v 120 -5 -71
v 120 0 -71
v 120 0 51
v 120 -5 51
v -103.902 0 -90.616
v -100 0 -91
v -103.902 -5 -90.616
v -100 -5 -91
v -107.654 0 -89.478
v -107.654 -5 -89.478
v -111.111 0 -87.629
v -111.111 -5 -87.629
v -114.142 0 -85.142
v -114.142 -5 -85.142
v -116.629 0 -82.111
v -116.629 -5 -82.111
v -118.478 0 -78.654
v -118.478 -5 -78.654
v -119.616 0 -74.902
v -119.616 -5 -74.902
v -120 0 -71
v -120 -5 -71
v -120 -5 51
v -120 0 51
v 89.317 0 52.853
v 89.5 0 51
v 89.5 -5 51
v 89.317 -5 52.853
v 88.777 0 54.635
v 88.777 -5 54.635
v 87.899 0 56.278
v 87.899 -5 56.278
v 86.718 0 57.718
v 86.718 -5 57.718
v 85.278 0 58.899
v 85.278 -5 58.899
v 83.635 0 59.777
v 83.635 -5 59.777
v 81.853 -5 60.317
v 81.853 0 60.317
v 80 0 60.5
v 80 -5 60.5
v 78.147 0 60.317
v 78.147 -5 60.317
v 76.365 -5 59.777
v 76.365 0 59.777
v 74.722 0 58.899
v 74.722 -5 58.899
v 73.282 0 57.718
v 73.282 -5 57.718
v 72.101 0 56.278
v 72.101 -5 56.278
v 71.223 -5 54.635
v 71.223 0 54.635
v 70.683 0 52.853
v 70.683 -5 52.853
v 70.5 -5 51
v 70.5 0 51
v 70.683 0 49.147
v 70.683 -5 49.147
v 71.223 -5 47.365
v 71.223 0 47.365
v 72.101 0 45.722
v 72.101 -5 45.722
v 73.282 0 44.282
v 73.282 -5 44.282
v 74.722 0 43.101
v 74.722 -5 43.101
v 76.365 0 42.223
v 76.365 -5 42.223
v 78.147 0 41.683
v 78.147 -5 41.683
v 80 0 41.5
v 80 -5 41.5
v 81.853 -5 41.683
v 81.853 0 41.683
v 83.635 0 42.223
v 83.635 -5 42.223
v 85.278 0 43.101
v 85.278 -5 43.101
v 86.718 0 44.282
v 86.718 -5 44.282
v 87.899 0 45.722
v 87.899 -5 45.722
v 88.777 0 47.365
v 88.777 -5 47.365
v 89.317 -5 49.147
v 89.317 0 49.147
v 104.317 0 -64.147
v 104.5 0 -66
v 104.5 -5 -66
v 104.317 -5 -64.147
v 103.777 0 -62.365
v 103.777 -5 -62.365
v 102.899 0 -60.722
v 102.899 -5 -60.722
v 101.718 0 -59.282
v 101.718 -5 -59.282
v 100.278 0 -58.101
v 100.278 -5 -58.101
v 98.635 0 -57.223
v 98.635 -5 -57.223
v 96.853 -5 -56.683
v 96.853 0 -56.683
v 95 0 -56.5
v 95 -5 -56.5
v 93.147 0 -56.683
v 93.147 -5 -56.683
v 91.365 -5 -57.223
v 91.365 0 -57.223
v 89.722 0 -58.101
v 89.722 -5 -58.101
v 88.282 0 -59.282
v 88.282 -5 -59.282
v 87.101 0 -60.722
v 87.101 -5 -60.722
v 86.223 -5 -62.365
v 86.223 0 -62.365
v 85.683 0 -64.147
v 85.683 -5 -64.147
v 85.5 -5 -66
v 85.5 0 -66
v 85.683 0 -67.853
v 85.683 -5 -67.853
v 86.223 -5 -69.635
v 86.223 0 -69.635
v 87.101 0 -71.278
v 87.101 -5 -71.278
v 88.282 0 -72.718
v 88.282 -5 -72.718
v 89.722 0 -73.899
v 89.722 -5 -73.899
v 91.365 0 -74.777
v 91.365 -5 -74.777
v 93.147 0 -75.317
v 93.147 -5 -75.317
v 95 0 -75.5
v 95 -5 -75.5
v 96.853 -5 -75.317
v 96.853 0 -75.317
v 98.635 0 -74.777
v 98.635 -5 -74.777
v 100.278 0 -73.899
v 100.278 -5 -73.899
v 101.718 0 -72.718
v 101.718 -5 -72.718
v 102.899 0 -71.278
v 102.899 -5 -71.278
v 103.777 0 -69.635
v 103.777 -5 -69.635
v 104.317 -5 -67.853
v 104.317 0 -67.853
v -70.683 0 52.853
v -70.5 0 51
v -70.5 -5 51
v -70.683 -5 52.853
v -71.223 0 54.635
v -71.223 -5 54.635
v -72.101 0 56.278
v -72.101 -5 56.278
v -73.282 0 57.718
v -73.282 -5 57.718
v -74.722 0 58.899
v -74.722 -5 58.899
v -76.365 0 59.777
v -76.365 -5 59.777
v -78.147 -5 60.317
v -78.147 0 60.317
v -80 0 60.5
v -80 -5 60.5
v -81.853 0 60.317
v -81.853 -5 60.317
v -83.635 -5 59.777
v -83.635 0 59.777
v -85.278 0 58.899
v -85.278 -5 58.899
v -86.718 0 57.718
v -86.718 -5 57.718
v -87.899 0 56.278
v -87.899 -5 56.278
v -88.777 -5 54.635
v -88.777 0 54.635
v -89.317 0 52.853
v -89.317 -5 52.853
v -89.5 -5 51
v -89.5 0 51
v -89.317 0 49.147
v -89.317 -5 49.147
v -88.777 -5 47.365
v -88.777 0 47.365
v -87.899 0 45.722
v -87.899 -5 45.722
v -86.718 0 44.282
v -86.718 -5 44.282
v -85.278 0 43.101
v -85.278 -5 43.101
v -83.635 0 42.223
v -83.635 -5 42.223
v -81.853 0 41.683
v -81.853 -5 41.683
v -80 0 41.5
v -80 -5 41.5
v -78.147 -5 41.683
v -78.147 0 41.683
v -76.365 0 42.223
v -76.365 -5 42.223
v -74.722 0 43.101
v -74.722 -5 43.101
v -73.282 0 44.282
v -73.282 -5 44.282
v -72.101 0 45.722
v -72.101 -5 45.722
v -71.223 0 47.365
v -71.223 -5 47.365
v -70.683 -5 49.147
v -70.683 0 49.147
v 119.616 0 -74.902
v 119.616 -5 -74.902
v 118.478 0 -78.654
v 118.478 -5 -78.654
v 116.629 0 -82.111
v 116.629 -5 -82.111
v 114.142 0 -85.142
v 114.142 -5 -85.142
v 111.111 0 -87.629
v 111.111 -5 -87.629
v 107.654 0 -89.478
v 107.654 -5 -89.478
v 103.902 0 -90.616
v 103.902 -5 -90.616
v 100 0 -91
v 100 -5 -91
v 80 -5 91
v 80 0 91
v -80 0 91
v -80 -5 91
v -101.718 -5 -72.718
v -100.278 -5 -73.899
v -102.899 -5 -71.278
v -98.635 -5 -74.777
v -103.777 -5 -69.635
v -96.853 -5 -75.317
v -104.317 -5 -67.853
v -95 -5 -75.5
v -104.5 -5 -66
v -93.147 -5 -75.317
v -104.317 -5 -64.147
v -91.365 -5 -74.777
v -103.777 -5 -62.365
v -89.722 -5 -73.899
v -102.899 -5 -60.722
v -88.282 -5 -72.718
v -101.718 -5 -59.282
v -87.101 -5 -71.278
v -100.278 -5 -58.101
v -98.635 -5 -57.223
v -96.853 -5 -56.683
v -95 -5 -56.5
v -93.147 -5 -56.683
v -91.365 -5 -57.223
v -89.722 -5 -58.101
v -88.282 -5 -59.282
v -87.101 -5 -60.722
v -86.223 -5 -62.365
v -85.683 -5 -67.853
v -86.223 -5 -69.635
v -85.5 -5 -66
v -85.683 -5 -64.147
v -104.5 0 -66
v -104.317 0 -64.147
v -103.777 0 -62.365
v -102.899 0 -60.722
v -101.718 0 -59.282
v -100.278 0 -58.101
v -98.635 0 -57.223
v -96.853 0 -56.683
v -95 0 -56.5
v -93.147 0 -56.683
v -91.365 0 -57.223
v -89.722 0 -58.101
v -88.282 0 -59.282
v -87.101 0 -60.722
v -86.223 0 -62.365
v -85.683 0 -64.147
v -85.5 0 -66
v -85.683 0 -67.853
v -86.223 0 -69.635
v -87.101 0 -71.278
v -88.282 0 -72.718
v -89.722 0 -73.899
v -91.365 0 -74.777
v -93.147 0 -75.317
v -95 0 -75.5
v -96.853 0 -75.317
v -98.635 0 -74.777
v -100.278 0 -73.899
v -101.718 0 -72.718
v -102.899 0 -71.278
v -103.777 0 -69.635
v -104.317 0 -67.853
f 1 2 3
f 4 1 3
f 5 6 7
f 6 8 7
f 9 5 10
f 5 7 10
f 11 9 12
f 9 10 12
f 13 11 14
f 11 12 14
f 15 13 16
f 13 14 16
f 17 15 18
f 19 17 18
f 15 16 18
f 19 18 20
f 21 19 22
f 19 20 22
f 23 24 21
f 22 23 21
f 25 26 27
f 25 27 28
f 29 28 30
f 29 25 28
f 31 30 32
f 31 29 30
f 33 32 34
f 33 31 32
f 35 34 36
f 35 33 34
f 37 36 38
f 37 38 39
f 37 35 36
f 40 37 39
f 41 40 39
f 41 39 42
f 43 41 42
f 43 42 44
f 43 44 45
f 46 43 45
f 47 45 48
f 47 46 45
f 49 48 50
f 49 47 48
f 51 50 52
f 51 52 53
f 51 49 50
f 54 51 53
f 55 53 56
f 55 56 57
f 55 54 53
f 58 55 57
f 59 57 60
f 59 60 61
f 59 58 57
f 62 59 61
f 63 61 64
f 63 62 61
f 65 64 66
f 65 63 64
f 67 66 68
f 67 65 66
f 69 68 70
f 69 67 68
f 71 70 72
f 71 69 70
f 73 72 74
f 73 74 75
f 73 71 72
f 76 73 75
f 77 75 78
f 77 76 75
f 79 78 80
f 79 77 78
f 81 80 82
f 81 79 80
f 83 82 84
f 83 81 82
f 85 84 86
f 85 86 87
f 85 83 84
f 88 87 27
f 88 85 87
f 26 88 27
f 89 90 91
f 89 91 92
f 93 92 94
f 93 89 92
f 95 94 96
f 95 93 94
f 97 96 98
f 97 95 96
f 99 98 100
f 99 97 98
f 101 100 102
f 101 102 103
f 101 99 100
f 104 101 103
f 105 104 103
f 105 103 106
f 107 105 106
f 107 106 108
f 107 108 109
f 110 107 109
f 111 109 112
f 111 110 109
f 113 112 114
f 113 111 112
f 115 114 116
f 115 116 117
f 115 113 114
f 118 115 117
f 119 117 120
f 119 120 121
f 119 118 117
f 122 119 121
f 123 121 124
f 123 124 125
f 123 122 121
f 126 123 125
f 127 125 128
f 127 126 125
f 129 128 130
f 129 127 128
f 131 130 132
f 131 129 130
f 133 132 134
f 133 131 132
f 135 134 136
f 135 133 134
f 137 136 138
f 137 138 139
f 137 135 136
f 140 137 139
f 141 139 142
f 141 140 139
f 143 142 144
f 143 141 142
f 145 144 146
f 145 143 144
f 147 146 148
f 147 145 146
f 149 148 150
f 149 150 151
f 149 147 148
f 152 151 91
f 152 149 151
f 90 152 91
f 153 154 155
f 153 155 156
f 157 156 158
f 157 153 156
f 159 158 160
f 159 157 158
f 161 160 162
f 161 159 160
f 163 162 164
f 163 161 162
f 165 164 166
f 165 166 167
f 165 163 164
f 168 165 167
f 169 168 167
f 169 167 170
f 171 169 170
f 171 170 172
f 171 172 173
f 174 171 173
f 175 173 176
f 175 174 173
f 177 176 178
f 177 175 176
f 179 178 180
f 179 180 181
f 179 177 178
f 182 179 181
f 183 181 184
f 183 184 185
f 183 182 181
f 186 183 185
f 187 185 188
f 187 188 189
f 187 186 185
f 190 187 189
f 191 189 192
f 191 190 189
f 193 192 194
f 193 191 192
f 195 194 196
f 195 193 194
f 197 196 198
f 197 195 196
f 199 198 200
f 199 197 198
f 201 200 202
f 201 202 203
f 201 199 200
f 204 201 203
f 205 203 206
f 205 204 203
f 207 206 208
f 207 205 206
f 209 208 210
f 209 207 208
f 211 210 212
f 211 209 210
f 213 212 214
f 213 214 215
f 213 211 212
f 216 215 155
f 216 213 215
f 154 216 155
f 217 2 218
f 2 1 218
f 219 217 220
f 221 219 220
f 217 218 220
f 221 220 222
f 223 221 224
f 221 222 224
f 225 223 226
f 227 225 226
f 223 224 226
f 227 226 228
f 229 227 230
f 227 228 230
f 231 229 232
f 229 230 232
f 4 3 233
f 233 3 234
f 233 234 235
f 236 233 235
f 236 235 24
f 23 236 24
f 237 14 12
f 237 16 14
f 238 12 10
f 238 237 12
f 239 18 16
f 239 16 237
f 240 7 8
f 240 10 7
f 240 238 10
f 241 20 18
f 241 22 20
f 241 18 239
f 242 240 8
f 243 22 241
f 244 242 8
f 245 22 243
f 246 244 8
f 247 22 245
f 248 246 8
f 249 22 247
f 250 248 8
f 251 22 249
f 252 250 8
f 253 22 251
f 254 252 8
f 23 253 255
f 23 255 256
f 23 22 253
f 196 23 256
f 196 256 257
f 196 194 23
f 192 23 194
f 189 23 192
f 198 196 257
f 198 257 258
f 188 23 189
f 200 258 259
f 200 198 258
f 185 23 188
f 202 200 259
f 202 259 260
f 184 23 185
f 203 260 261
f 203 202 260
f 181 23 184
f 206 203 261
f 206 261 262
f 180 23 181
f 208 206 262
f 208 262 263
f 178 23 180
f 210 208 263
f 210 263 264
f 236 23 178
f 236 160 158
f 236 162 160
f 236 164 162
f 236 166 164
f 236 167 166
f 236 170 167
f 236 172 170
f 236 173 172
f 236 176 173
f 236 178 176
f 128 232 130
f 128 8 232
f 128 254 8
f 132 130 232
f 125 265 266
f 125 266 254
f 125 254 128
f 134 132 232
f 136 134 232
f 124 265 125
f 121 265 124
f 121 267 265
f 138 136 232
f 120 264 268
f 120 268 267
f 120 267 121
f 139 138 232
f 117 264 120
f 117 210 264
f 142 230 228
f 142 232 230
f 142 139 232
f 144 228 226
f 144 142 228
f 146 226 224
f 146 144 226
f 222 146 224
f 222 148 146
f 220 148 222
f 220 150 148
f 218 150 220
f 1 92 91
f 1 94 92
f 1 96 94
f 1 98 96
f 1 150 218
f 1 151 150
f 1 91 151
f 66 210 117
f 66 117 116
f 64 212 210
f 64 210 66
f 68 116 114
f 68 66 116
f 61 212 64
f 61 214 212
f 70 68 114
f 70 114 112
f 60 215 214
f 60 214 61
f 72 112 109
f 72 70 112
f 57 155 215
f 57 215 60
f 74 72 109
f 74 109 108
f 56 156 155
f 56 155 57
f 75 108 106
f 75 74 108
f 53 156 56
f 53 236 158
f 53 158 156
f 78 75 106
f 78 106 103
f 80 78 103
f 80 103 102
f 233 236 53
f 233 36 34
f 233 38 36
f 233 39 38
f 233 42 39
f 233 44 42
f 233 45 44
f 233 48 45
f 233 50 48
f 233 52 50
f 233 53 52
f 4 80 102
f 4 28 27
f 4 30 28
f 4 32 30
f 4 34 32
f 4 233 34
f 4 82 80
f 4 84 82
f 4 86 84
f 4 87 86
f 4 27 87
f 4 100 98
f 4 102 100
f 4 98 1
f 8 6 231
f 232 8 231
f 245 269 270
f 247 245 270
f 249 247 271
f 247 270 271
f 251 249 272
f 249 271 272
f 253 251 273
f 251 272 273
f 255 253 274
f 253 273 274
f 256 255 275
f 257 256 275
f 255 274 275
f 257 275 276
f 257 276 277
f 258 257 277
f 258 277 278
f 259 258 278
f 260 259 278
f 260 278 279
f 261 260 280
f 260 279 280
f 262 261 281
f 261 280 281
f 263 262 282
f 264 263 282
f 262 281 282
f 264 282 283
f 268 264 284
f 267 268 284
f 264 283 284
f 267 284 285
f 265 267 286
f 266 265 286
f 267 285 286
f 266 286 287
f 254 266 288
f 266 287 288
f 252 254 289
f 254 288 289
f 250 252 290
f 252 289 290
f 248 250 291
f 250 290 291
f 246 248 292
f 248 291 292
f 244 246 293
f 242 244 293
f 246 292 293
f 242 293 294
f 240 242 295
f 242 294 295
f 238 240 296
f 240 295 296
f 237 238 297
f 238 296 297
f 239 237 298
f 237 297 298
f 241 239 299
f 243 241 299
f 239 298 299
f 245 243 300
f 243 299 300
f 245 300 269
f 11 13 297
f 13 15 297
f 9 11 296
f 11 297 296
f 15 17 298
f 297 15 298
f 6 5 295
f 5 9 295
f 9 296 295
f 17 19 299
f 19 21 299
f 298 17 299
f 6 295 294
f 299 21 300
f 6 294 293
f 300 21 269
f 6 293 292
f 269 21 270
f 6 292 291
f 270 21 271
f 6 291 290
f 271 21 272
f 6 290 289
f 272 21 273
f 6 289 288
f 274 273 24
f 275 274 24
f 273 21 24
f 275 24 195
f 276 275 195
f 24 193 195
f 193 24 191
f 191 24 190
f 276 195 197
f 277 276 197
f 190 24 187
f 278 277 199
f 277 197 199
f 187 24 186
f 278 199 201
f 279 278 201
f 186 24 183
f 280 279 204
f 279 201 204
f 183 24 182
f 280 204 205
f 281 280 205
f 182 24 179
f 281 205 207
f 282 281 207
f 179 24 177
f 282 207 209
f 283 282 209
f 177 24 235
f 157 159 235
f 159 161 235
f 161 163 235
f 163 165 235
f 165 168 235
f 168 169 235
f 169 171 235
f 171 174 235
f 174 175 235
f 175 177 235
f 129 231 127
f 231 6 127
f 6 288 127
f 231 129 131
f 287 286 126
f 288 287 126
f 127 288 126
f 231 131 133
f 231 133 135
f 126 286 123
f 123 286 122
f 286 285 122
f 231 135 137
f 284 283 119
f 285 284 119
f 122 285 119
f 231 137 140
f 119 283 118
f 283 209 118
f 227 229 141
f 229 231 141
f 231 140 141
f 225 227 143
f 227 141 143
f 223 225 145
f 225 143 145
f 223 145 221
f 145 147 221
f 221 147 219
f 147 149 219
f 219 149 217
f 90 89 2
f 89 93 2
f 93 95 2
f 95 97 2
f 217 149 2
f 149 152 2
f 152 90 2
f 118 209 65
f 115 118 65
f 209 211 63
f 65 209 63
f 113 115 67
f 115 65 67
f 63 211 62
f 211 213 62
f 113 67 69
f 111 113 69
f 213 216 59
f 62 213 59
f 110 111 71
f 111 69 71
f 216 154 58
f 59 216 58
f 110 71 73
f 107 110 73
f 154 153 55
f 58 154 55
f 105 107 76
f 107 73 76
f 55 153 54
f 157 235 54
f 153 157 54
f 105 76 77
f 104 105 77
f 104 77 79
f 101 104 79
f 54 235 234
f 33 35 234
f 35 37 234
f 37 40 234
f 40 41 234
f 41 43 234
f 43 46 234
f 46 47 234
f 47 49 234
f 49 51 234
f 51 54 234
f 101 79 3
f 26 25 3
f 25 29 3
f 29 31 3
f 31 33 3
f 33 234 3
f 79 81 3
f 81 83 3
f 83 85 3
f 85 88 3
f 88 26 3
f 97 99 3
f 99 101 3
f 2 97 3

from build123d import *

# Parameters (mm, degrees)
F0_R     = 9.5
F1_DEPTH = 5
F2_R     = 20


with BuildPart() as f1:
    # F0 (on Front) → F1 (new body)
    with BuildSketch(Plane.XZ):
        with BuildLine():
            ThreePointArc((-85.5, -66), (-95, -56.5), (-104.5, -66))
            ThreePointArc((-104.5, -66), (-95, -75.5), (-85.5, -66))
        make_face()
        with Locations((95, -66)):
            Circle(F0_R)
        Polygon((120, 51), (80, 91), (-80, 91), (-120, 51), (-120, -66), (-120, -91), (120, -91), (120, -66), align=None)
        with BuildLine():
            ThreePointArc((-85.5, -66), (-95, -75.5), (-104.5, -66))
            ThreePointArc((-104.5, -66), (-95, -56.5), (-85.5, -66))
        make_face(mode=Mode.SUBTRACT)
        with Locations((95, -66)):
            Circle(F0_R, mode=Mode.SUBTRACT)
        with Locations((-80, 51)):
            Circle(F0_R, mode=Mode.SUBTRACT)
        with Locations((80, 51)):
            Circle(F0_R, mode=Mode.SUBTRACT)
    extrude(amount=F1_DEPTH)

    # F2
    f2_edges = [f1.edges().sort_by_distance(p)[0] for p in [
        (-120, -2.5, -91),
        (120, -2.5, -91),
    ]]
    fillet(f2_edges, radius=F2_R)


solid = f1.part
